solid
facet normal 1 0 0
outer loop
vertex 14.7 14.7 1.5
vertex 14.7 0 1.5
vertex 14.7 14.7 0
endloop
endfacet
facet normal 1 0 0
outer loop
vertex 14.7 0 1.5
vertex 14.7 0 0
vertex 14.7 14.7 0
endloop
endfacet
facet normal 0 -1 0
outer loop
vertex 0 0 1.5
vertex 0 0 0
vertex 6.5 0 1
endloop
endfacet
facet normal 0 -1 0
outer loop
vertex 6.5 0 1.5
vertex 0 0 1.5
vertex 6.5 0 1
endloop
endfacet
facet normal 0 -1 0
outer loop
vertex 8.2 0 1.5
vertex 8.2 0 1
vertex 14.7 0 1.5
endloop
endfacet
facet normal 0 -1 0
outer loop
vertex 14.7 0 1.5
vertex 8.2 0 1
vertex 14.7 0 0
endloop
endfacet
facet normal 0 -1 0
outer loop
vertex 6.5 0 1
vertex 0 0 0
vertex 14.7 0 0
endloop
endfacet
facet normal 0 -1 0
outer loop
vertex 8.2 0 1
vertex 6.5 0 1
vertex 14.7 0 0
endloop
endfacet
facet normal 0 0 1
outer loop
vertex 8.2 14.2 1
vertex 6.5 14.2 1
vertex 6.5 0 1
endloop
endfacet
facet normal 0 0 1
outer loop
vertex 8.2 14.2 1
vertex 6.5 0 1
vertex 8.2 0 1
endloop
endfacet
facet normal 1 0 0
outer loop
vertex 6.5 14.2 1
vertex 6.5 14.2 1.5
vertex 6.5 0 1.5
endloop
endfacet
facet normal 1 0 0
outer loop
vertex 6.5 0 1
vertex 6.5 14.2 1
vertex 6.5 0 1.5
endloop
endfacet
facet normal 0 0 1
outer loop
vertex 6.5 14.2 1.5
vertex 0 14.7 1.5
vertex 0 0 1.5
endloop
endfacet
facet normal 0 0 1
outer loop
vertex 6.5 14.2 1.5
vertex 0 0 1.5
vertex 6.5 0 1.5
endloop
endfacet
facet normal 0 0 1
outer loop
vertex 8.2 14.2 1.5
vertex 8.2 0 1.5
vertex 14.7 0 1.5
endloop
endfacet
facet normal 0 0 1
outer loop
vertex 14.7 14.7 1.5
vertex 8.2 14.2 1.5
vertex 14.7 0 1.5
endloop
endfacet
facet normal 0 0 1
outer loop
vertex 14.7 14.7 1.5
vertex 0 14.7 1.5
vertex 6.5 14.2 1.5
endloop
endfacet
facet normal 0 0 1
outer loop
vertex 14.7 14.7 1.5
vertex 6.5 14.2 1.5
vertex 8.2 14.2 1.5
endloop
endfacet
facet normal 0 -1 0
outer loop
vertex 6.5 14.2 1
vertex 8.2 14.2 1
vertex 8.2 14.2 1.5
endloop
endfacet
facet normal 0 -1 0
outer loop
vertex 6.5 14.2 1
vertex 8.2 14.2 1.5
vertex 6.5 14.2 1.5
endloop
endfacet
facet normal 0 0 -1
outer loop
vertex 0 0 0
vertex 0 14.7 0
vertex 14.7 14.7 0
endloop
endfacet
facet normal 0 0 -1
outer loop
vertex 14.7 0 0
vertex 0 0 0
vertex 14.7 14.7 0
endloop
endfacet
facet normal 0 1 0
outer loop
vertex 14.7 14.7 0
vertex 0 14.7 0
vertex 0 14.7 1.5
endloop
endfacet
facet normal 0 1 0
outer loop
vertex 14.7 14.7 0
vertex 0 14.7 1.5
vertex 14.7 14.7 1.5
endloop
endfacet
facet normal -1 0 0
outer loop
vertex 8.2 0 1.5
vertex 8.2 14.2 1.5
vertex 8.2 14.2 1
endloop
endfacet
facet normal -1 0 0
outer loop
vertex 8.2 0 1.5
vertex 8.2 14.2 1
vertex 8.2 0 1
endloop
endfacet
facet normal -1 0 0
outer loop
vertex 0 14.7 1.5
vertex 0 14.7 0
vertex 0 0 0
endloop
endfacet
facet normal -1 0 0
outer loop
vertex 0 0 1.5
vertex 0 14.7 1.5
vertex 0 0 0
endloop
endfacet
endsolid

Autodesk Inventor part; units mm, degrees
ref_plane "YZ Plane" through (0, 0, 0) normal (1, 0, 0) x (0, 1, 0)
ref_plane "XZ Plane" through (0, 0, 0) normal (0, 1, 0) x (-1, 0, 0)
ref_plane "XY Plane" through (0, 0, 0) normal (0, 0, 1) x (1, 0, 0)
sketch "Sketch1" plane through (0, 0, 0) normal (0, 0, 1) x (1, 0, 0)
  line L0 (0, 0) -> (14.7, 0)
  line L1 (14.7, 0) -> (14.7, 14.7)
  line L2 (14.7, 14.7) -> (0, 14.7)
  line L3 (0, 14.7) -> (0, 0)
  dimension "d0" = 14.7
  dimension "d1" = 14.7
extrude "Extrusion1" add sketch "Sketch1" along normal blind 1.5
sketch "Sketch2" plane through (0, 0, 1.5) normal (0, 0, 1) x (1, 0, 0)
  line L0 (0, 0) -> (14.7, 0) projected
  line L1 (14.7, 14.7) -> (0, 14.7) projected
  line L2 (8.2, 14.7) -> (8.2, 0)
  line L3 (6.5, 14.7) -> (6.5, 0)
  dimension "d6" = 1.7
  dimension "d7" = 6.5
extrude "Extrusion2" cut sketch "Sketch2" against normal blind 0.5
sketch "Sketch3" plane through (0, 0, 1) normal (0, 0, 1) x (1, 0, 0)
  line L0 (8.2, 14.7) -> (8.2, 0) projected
  line L1 (6.5, 14.7) -> (8.2, 14.7)
  line L2 (8.2, 14.7) -> (8.2, 14.2)
  line L3 (8.2, 14.2) -> (6.5, 14.2)
  line L4 (6.5, 14.2) -> (6.5, 14.7)
  point P0 (0, 0)
  dimension "d8" = 0.5
extrude "Extrusion3" add sketch "Sketch3" along normal blind 0.5
properties part number "Voorplaat"
